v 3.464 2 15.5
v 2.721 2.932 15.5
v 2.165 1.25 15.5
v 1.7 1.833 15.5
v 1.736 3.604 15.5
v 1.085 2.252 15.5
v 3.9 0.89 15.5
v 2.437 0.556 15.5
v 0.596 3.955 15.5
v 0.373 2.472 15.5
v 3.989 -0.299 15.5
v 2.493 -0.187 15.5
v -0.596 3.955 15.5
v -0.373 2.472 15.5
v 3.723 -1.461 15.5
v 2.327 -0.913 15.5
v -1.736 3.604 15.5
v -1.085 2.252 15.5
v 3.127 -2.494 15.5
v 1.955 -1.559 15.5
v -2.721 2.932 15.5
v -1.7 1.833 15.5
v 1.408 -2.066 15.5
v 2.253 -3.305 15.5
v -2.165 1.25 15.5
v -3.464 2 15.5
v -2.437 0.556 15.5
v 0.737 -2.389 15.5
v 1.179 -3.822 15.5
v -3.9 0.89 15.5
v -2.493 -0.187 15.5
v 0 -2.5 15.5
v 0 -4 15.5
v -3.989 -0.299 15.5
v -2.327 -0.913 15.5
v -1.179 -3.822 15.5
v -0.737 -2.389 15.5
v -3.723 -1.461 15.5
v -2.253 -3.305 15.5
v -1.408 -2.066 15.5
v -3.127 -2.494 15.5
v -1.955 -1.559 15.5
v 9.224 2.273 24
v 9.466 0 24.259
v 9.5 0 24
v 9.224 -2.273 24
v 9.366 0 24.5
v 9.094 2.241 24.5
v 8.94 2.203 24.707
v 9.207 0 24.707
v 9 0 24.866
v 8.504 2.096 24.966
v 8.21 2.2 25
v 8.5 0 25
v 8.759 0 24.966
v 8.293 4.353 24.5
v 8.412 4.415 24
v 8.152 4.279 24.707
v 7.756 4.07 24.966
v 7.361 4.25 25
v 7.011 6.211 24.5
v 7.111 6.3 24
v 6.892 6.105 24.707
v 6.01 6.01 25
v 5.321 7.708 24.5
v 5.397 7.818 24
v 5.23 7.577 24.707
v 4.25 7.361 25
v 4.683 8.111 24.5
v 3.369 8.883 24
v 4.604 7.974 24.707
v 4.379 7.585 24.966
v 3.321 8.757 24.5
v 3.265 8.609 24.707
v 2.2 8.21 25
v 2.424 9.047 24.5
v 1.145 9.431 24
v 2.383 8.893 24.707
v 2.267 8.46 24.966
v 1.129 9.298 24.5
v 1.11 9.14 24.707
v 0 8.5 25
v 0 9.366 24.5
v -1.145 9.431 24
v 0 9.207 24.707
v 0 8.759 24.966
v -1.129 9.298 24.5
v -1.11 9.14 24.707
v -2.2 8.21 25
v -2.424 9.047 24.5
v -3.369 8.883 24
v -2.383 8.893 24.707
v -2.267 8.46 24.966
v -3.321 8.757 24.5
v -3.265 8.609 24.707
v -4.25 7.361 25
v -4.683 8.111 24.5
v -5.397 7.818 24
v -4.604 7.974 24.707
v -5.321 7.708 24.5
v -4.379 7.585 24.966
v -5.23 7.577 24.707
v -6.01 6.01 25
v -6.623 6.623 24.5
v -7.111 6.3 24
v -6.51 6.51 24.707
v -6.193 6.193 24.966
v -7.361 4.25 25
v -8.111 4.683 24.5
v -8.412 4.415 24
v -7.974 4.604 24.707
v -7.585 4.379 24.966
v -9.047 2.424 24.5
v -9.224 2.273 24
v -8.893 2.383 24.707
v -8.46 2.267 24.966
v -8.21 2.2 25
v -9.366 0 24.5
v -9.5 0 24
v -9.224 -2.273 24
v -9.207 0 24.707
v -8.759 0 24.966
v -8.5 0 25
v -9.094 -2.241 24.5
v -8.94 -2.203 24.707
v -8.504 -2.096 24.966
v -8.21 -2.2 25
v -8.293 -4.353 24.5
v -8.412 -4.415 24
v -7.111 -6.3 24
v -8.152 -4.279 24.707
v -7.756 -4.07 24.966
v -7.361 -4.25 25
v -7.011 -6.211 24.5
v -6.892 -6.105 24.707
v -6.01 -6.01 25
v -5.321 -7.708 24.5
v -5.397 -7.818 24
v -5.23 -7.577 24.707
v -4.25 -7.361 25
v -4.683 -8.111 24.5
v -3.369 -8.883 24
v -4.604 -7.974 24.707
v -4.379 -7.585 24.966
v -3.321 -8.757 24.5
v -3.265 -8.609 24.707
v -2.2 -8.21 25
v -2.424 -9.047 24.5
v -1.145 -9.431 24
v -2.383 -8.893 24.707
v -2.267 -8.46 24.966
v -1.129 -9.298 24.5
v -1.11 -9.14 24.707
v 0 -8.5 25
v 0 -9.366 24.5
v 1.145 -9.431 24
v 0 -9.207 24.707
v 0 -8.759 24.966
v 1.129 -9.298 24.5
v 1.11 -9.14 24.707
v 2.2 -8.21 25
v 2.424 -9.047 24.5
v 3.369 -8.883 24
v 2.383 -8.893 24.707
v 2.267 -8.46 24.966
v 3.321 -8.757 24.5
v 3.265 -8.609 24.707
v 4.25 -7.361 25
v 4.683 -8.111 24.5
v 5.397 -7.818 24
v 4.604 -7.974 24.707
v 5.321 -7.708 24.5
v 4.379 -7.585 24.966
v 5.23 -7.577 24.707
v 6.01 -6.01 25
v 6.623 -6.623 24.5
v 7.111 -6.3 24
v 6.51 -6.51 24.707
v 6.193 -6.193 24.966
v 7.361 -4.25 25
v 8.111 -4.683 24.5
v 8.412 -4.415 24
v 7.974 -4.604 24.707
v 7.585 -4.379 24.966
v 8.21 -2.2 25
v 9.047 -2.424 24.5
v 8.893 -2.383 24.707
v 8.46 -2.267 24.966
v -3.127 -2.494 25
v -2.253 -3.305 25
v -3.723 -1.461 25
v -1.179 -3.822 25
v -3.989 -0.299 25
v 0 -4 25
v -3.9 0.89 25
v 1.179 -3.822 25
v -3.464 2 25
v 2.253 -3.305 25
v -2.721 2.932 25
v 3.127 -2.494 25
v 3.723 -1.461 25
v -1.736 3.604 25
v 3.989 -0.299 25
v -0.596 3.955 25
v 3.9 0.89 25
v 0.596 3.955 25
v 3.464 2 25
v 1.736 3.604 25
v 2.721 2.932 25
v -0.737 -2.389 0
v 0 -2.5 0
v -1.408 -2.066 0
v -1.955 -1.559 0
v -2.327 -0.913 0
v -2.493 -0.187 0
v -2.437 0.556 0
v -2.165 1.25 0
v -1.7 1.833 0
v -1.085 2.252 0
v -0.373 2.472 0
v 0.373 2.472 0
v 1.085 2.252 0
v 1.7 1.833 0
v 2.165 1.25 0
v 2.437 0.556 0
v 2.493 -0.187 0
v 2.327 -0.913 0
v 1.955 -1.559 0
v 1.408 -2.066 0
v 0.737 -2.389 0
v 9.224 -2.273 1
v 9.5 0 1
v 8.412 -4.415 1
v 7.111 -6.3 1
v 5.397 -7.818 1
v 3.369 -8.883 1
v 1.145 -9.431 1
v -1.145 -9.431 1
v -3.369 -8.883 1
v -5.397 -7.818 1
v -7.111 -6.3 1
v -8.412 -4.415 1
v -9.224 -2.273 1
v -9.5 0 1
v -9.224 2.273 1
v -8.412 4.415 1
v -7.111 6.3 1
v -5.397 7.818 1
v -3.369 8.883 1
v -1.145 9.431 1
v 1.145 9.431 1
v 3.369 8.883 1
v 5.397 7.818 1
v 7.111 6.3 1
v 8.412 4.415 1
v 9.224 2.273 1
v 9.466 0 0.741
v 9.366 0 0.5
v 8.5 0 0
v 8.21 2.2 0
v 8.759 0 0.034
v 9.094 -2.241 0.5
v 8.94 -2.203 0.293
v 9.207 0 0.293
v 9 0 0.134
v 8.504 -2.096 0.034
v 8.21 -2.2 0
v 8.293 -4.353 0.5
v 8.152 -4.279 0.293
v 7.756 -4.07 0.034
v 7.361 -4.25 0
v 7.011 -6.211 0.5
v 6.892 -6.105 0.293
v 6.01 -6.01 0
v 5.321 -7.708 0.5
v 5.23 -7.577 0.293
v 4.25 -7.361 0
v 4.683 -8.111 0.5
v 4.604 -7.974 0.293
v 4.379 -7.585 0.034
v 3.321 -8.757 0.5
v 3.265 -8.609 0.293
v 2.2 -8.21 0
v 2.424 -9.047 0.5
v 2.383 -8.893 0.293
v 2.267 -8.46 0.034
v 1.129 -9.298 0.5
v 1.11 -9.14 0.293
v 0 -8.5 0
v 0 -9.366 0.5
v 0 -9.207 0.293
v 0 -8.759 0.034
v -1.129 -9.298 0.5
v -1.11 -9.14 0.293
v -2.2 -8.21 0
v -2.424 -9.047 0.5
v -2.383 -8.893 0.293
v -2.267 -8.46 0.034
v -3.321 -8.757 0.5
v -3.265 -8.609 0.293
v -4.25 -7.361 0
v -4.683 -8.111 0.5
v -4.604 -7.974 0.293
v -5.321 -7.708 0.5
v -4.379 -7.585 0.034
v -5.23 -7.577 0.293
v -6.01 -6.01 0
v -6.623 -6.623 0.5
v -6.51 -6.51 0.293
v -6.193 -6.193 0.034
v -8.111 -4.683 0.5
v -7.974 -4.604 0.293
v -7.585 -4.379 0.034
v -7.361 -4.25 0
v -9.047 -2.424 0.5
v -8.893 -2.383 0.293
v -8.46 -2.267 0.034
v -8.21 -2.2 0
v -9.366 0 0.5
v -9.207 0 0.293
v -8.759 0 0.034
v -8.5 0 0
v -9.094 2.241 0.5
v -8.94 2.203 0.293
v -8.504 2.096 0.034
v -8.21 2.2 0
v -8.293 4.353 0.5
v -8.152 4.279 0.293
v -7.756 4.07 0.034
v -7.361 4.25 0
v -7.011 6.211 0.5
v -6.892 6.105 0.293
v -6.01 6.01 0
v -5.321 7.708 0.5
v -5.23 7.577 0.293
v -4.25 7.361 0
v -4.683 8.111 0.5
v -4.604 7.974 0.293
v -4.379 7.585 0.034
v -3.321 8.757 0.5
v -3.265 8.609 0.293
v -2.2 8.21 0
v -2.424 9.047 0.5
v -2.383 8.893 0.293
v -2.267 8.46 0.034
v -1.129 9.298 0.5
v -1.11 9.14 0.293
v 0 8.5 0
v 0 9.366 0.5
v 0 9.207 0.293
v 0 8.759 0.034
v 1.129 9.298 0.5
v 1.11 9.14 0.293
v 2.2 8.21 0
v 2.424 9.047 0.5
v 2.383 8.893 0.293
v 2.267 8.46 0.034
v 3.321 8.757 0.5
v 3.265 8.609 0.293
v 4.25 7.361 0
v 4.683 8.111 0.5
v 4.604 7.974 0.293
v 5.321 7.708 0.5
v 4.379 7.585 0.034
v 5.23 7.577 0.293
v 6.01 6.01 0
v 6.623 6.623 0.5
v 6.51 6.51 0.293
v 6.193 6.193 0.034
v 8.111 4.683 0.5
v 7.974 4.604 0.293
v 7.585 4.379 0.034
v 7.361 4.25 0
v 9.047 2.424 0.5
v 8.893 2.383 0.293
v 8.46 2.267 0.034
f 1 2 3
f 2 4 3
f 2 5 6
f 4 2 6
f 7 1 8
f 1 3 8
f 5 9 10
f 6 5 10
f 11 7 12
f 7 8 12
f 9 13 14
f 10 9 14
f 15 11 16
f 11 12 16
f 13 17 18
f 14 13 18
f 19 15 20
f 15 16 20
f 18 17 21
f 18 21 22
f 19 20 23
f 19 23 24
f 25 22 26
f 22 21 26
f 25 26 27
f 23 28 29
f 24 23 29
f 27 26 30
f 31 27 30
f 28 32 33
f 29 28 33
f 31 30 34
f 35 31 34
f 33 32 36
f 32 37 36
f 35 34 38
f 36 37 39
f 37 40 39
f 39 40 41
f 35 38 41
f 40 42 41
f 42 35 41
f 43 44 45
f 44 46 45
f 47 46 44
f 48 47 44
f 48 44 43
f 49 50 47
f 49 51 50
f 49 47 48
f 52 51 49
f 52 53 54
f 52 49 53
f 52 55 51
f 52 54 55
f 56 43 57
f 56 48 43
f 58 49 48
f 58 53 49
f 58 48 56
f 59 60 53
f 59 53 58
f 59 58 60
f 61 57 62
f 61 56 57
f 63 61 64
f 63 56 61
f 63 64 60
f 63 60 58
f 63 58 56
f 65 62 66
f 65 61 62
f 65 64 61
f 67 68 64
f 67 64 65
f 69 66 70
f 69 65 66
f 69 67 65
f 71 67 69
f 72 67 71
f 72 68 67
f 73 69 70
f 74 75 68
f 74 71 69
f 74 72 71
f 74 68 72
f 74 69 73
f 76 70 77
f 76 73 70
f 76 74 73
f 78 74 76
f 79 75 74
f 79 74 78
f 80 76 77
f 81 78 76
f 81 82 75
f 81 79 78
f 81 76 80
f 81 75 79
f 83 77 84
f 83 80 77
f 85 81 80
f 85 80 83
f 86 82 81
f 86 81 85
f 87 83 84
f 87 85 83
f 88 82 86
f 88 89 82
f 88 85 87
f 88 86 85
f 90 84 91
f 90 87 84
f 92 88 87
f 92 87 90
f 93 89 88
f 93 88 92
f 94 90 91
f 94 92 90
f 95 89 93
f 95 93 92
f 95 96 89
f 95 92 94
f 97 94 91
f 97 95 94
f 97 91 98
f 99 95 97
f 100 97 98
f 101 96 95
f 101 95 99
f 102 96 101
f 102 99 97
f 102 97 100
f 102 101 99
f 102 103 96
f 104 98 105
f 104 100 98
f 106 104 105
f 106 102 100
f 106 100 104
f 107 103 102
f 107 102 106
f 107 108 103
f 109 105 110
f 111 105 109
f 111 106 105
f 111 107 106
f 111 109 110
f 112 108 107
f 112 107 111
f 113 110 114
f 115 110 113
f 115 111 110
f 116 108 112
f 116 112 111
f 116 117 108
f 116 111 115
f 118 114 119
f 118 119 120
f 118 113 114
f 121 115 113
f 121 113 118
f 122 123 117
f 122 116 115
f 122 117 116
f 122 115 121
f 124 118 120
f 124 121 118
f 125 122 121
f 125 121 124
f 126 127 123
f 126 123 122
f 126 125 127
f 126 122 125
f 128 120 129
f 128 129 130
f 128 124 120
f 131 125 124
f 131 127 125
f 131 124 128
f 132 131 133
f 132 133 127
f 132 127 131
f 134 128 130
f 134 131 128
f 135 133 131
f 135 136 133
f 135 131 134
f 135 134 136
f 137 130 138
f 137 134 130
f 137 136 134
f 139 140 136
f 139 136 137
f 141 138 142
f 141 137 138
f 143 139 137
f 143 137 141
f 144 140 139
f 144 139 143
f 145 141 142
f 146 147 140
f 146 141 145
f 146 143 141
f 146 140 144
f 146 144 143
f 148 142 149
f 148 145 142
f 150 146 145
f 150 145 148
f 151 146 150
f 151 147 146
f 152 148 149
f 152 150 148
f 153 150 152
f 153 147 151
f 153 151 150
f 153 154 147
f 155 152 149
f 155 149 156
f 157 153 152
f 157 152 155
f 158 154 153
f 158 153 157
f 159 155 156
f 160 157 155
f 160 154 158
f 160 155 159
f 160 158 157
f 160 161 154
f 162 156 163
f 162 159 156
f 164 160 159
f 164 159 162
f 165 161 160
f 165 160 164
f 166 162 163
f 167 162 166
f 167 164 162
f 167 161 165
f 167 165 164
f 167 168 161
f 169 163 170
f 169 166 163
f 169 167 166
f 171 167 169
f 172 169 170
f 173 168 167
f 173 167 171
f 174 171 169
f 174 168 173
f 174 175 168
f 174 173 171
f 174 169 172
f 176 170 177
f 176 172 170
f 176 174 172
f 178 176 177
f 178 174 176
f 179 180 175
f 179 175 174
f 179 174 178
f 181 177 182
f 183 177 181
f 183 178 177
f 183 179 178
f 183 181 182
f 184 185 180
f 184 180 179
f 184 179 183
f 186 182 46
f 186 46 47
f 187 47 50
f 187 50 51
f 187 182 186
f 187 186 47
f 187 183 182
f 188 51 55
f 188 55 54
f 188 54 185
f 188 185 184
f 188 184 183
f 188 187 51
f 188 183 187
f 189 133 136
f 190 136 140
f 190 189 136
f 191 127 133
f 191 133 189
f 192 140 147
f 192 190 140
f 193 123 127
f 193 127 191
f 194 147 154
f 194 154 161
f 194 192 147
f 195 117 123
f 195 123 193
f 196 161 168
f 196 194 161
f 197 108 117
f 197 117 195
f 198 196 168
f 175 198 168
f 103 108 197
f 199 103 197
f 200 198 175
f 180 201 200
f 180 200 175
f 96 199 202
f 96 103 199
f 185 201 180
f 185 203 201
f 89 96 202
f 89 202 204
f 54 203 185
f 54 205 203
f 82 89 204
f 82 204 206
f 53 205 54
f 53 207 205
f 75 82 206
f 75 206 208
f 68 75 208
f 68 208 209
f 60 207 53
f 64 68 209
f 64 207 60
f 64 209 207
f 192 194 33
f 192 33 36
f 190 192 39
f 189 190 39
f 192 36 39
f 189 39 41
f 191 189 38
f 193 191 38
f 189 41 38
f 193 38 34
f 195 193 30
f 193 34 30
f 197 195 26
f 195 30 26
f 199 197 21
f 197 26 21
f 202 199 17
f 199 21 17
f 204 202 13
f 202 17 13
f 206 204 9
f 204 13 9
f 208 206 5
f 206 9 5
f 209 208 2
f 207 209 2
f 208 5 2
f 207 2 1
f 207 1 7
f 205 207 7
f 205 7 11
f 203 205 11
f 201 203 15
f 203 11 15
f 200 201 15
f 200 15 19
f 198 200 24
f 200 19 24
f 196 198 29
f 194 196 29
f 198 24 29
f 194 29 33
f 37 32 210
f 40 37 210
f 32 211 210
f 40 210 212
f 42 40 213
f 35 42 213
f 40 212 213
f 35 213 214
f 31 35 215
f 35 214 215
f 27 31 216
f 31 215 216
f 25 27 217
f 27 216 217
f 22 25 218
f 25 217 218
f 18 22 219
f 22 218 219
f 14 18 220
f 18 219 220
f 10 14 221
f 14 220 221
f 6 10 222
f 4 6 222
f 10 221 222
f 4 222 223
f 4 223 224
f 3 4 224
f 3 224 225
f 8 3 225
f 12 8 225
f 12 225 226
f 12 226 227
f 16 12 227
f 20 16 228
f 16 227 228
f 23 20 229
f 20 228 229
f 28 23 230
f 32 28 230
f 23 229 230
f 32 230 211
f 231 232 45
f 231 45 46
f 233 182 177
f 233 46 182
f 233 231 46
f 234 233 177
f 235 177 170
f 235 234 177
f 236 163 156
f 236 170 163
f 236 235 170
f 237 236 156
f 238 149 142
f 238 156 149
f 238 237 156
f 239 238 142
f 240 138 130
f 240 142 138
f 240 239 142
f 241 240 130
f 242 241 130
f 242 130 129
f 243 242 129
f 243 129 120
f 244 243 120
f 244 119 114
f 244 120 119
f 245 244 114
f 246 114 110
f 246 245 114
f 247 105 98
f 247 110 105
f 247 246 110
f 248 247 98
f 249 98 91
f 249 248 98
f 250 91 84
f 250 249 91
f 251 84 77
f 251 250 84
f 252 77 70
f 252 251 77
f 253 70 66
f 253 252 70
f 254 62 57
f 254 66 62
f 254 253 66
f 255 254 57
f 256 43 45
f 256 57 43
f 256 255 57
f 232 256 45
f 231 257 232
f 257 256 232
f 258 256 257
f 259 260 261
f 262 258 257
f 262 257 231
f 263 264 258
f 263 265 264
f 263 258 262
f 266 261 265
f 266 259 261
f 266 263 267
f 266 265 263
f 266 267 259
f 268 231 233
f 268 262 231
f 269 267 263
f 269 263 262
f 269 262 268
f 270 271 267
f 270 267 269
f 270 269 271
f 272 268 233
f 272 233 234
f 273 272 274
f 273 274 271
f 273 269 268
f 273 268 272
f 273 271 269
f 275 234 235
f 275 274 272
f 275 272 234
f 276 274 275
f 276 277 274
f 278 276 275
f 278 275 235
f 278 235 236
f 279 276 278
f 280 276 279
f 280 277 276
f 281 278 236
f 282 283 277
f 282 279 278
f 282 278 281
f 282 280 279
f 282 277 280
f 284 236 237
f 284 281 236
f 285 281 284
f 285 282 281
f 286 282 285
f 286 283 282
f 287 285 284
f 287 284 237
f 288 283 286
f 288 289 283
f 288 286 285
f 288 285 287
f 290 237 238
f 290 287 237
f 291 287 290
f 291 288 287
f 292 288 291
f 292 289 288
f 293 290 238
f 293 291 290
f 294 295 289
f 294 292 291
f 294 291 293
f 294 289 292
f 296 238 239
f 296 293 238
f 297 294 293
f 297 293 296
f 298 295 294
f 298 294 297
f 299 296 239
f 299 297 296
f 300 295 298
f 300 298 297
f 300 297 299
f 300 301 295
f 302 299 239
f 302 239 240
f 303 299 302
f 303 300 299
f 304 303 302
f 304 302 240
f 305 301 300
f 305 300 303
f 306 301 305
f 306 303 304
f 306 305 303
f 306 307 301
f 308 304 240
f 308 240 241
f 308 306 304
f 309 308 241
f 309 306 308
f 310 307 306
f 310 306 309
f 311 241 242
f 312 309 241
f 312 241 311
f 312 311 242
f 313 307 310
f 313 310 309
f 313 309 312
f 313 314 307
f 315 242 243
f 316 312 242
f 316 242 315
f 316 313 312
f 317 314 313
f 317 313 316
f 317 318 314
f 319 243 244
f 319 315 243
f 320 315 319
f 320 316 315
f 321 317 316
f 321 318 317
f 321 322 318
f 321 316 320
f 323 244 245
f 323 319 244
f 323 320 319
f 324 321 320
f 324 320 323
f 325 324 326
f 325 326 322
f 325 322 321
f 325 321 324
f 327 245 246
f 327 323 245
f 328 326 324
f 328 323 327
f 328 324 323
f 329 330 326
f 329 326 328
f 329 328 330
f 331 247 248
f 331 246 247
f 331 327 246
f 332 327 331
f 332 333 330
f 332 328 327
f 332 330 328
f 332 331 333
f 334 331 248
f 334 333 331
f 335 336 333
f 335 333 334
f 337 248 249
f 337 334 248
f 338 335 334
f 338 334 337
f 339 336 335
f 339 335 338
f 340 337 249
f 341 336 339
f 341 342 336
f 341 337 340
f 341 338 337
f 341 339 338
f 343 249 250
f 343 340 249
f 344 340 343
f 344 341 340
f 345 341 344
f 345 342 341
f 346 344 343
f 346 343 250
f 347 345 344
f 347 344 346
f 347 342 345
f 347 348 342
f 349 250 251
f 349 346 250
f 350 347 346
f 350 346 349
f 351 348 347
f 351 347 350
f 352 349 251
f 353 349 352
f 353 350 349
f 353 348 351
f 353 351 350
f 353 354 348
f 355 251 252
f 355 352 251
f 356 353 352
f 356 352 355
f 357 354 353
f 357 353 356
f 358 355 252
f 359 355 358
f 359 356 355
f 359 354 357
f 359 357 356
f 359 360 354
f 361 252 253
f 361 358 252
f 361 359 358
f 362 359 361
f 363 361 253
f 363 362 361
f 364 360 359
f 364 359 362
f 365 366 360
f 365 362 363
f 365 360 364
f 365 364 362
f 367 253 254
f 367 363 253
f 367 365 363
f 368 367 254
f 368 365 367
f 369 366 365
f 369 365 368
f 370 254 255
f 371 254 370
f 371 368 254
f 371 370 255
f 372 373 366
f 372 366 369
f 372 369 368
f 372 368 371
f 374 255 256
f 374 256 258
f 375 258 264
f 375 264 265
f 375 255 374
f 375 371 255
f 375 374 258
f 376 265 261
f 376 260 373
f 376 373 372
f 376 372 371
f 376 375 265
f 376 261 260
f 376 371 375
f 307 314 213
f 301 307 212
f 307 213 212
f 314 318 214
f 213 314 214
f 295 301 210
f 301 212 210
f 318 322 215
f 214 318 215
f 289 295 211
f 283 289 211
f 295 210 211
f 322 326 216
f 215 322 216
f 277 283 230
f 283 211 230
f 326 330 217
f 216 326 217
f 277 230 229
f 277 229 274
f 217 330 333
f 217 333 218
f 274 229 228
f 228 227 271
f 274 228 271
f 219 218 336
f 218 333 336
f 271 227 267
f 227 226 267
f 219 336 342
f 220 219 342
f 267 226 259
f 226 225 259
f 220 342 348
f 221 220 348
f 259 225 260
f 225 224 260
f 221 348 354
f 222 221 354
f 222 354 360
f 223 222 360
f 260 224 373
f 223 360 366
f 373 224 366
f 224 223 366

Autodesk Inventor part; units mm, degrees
ref_plane "YZ Plane" through (0, 0, 0) normal (1, 0, 0) x (0, 1, 0)
ref_plane "XZ Plane" through (0, 0, 0) normal (0, 1, 0) x (-1, 0, 0)
ref_plane "XY Plane" through (0, 0, 0) normal (0, 0, 1) x (1, 0, 0)
sketch "Esboço1" plane through (0, 0, 0) normal (0, 0, 1) x (1, 0, 0)
  circle A0 centre (0, 0) radius 9.5
  dimension "d0" = 19
extrude "Extrusão1" add sketch "Esboço1" along normal blind 25
sketch "Esboço4" plane through (0, 0, 25) normal (0, 0, 1) x (1, 0, 0)
  circle A0 centre (0, 0) radius 1.7116
hole "Furo1" at (0, 0, 25) direction (0, 0, -1) diameter 5 end through all counterbore diameter 8 counterbore depth 9.5
fillet "Arredondamento1" radius 1 2 edges at (-9.5, 0, 0) (-9.5, 0, 25)
properties part number "Acoplamento5Para8"
